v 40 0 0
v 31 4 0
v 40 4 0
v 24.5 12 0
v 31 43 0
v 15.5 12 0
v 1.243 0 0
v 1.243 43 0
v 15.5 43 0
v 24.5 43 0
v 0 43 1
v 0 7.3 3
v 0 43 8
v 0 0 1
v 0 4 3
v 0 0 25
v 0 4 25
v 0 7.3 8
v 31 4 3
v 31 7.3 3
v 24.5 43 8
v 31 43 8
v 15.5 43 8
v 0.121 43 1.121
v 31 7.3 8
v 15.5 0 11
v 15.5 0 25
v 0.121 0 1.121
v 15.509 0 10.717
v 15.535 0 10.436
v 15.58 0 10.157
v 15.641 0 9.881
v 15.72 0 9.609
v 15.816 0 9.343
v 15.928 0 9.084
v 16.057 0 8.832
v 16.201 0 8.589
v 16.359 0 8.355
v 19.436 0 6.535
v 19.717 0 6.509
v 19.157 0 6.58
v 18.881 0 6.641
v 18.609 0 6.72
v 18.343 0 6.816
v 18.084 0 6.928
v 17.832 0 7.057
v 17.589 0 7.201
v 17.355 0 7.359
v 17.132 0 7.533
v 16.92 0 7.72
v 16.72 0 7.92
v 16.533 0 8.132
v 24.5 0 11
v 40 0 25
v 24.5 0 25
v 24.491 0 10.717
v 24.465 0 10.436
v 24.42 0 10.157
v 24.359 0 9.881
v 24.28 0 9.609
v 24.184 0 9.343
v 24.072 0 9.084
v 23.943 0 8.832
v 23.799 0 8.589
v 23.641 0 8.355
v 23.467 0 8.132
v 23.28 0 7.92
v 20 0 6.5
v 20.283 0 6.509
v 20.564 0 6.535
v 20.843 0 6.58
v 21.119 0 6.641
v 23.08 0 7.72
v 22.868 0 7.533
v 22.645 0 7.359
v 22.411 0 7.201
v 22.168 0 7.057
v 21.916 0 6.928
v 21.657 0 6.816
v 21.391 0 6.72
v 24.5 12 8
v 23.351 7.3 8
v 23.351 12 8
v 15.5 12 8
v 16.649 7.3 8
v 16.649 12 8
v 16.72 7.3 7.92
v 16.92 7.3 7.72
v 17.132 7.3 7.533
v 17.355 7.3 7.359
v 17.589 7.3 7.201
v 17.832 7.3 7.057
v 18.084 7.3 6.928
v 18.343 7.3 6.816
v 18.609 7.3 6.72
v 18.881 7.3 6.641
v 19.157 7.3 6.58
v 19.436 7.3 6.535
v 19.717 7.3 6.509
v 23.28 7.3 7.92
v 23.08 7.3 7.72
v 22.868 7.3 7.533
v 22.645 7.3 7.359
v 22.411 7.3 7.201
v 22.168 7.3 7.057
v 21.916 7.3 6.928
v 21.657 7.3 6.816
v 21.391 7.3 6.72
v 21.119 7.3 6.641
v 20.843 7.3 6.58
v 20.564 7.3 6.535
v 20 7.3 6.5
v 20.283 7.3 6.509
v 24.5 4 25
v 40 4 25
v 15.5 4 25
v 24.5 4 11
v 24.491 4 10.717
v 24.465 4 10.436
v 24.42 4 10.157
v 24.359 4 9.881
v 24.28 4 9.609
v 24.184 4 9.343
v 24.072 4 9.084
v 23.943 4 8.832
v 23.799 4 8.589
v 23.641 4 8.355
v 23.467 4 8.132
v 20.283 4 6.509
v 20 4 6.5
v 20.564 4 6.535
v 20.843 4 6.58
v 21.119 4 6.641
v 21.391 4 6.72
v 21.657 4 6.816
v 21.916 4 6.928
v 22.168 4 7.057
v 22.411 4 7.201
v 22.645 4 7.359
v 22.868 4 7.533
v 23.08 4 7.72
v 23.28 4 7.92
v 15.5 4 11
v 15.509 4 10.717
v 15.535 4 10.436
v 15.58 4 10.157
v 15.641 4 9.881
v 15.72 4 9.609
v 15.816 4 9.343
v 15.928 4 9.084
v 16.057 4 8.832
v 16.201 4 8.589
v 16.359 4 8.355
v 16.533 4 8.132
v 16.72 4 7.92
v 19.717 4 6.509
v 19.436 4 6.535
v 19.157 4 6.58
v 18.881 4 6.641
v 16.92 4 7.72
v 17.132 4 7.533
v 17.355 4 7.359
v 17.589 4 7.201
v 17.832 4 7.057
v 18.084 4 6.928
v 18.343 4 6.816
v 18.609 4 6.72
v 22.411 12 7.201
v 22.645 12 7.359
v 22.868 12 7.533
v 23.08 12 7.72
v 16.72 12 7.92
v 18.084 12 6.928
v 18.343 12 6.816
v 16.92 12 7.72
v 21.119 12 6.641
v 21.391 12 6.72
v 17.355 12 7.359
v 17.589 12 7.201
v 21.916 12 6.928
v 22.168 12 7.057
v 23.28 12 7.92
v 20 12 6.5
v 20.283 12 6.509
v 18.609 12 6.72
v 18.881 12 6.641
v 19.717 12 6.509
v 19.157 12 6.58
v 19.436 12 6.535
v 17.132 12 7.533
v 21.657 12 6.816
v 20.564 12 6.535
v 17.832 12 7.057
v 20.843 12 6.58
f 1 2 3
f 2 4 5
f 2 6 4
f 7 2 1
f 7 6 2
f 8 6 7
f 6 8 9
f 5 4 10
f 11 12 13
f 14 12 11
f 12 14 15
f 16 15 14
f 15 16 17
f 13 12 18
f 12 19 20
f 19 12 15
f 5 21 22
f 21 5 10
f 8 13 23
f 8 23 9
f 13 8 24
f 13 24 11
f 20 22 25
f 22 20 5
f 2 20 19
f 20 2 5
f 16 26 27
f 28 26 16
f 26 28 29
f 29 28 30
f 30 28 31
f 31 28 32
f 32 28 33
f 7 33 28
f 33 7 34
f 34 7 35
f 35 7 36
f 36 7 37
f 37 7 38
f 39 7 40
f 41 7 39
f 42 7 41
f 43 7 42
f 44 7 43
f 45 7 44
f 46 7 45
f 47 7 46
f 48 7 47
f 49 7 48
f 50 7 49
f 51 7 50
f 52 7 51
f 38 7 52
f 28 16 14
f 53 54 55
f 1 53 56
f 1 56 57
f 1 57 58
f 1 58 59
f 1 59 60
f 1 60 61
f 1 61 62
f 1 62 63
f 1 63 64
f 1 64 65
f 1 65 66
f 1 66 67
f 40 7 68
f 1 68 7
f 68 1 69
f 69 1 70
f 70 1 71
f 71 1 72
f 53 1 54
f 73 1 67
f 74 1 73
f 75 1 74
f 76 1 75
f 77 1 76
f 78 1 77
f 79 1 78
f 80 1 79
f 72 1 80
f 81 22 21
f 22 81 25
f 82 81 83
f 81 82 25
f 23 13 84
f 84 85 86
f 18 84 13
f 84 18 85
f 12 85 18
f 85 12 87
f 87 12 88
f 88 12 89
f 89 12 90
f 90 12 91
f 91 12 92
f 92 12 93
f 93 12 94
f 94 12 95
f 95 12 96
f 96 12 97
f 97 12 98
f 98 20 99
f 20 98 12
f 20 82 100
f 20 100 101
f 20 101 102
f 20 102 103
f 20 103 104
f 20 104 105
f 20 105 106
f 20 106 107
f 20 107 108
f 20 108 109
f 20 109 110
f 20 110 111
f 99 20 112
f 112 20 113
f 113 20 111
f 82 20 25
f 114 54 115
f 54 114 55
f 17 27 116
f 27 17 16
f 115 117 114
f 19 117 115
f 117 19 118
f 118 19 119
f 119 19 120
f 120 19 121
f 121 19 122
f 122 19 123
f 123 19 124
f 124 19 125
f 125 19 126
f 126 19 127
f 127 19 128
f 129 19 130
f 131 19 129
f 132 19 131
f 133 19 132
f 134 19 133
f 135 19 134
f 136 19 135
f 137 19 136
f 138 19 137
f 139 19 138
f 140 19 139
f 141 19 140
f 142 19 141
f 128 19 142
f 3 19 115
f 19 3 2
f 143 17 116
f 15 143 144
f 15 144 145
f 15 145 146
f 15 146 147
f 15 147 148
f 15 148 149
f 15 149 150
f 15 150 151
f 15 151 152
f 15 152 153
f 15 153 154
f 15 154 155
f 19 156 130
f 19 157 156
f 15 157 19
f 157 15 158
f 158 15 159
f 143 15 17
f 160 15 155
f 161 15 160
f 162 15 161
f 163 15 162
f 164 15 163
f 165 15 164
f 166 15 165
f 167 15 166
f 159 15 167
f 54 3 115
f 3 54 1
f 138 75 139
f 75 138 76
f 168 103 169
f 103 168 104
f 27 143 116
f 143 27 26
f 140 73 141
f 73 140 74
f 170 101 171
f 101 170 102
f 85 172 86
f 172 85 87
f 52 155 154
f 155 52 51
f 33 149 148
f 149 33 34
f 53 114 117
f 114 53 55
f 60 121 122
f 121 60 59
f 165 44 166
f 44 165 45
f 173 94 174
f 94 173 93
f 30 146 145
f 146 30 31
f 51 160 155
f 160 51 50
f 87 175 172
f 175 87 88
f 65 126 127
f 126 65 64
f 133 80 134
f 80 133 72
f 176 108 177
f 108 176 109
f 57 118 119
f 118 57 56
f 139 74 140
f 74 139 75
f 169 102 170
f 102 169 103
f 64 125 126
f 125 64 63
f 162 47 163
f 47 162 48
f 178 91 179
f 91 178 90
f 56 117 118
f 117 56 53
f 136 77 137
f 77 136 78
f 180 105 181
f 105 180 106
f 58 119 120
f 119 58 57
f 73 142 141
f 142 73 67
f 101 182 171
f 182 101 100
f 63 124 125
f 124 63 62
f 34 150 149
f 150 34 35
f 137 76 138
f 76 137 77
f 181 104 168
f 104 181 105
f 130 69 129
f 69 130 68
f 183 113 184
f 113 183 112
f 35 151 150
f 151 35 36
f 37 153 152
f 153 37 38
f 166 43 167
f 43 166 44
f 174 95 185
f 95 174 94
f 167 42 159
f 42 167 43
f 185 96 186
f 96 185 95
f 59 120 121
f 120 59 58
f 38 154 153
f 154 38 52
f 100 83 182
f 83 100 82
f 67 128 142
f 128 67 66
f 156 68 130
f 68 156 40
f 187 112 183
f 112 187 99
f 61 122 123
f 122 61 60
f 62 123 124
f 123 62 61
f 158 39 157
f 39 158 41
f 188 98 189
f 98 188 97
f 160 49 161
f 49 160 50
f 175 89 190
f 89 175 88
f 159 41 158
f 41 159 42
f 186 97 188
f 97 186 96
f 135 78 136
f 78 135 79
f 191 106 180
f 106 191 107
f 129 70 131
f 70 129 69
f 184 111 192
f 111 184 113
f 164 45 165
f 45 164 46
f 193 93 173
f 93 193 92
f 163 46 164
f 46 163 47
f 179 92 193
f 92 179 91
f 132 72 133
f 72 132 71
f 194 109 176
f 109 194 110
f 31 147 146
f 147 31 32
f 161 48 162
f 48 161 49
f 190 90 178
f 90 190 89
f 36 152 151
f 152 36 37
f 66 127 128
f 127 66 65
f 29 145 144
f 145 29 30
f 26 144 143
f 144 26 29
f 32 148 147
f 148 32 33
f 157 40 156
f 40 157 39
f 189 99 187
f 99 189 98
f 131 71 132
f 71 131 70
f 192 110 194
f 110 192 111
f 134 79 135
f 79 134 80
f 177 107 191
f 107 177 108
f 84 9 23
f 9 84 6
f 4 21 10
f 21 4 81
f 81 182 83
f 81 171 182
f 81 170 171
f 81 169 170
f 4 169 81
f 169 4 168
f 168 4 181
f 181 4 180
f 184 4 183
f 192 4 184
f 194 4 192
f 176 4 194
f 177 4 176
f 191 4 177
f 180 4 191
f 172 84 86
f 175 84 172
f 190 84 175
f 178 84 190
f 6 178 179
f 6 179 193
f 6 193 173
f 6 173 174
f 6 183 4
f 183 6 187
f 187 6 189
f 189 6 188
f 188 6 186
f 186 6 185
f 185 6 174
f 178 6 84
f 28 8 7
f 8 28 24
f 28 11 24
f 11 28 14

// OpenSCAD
difference() {
    color("red") union(){
        linear_extrude(3) square([31,43]);
        translate([0,7.3,0]) linear_extrude(8) square([31,35.7]);
        linear_extrude(25)  square([40,4]);
    }
    translate([20,-0.5,11]) rotate([-90,0,0]) linear_extrude(50) hull() {
        circle(4.5,$fn=100);
        translate([-4.5,-25,0]) square([9,9]);
    }
    translate([20,12,0]) rotate([-90,0,0]) linear_extrude(50) hull() {
        circle(4.5,$fn=100);
        translate([-4.5,-25,0]) square([9,9]);
    }
    translate([-2,45,-1]) rotate([0,45,0]) rotate([90,0,0]) linear_extrude(50) square([3,3]);
}
